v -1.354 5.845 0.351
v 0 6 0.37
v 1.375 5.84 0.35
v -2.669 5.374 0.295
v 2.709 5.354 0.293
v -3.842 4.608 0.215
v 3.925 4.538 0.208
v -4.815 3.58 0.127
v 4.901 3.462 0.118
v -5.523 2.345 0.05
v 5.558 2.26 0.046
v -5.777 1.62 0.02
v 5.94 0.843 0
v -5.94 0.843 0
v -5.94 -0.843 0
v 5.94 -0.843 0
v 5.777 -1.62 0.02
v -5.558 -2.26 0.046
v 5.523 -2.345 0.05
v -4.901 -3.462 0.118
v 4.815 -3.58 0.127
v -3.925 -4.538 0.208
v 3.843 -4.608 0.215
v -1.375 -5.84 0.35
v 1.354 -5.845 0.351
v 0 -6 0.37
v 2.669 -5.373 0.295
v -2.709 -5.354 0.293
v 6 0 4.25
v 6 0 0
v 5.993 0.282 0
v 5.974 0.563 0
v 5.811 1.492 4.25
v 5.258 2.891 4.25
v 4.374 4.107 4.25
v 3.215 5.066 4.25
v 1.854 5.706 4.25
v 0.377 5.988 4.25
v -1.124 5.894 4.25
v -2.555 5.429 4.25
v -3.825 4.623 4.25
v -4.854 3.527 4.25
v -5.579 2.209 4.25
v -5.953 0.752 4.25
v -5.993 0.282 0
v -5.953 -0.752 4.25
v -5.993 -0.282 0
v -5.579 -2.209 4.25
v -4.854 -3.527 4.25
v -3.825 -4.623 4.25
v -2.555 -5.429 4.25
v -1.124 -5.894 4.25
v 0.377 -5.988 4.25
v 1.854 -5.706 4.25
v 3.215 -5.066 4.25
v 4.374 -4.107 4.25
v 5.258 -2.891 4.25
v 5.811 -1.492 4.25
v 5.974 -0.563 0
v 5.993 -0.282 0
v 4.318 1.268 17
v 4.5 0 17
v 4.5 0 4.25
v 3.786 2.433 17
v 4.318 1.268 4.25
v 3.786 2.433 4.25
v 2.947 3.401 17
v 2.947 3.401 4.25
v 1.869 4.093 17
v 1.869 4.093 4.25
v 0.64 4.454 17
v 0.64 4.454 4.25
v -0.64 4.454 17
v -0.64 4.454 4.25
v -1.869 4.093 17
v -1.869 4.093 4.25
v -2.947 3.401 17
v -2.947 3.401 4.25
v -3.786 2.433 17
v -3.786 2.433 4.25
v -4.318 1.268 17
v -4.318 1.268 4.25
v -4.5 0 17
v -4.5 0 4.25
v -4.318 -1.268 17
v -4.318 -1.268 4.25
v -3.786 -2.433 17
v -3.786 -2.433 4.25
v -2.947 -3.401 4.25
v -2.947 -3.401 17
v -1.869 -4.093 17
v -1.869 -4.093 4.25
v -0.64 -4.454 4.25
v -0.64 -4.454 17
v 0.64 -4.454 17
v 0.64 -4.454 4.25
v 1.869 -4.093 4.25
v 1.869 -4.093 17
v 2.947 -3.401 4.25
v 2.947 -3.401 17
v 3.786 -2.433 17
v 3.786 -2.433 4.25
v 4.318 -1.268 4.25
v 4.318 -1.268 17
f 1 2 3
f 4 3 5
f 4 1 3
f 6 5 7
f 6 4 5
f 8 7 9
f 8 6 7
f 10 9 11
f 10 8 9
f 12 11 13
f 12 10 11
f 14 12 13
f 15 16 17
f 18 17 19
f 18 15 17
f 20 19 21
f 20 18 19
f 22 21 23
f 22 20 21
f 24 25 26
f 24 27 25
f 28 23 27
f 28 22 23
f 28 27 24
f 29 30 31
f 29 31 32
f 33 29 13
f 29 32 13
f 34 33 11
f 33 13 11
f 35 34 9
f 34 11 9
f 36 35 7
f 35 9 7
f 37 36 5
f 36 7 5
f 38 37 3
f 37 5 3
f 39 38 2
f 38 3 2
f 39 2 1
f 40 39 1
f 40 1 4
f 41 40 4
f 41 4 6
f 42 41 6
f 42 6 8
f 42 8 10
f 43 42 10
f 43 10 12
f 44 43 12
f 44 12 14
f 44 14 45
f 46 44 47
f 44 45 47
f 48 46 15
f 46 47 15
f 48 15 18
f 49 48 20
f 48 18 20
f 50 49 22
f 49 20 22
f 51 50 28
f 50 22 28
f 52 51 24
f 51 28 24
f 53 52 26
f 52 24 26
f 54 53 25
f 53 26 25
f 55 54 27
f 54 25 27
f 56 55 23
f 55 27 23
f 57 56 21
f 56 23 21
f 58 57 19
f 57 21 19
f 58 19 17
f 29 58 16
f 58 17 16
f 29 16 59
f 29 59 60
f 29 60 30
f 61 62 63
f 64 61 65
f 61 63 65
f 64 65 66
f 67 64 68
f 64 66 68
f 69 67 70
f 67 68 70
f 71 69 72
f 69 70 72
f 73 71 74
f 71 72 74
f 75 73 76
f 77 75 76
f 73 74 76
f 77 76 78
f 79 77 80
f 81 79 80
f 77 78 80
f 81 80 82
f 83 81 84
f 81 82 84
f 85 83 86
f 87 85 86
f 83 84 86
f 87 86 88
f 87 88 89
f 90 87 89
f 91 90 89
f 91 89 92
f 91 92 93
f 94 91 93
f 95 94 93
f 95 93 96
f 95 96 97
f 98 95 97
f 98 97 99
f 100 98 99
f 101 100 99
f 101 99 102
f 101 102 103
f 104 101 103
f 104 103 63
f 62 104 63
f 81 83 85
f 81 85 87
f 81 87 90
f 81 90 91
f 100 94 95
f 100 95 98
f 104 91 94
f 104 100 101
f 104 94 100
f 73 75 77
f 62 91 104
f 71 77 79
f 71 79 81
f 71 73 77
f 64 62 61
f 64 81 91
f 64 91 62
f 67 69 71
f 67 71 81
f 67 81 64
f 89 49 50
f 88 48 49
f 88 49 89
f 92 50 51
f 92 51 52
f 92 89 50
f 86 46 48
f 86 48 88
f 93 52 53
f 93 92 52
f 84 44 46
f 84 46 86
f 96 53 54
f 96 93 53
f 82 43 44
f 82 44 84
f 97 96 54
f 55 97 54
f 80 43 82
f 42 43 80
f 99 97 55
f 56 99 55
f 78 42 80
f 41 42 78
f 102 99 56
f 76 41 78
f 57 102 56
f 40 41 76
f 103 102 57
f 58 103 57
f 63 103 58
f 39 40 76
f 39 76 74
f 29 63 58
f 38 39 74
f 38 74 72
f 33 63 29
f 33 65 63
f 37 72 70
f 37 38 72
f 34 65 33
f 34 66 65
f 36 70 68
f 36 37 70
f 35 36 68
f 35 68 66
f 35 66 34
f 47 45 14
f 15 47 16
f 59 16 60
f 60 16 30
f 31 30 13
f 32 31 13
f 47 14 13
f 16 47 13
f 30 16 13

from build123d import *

# Parameters (mm, degrees)
SKETCH1_R               = 4.5
BOSS_EXTRUDE1_DEPTH     = 17
SKETCH1_3_R             = 6
SKETCH1_3_R_2           = 4.5
BOSS_EXTRUDE2_DEPTH     = 4.25
CUT_EXTRUDE1_DEPTH      = 20
CUT_EXTRUDE1_DEPTH_BACK = 20


with BuildPart() as part:
    # Sketch1 → Boss-Extrude1 (new body)
    with BuildSketch(Plane.XY):
        Circle(SKETCH1_R)
    extrude(amount=BOSS_EXTRUDE1_DEPTH)

    # Sketch1<3> → Boss-Extrude2 (add)
    with BuildSketch(Plane.XY):
        Circle(SKETCH1_3_R)
        Circle(SKETCH1_3_R_2, mode=Mode.SUBTRACT)
    extrude(amount=BOSS_EXTRUDE2_DEPTH)

    # Sketch2 → Cut-Extrude1 (cut, two sides: drawn at the far end of the back side and taken through both)
    with BuildSketch(Plane(origin=(0, 0, 0), x_dir=(0, 0, -1), z_dir=(1, 0, 0)).offset(-CUT_EXTRUDE1_DEPTH_BACK)):
        with BuildLine():
            Line((0, 6), (-0.37, 6))
            ThreePointArc((-0.37, 6), (-0.115349001, 3.426659852), (0, 0.843324554))
            Line((0, 0.843324554), (0, 6))
        make_face()
        with BuildLine():
            Line((0, -6), (0, -0.843324554))
            ThreePointArc((0, -0.843324554), (-0.115349001, -3.426659852), (-0.37, -6))
            Line((-0.37, -6), (0, -6))
        make_face()
    extrude(amount=CUT_EXTRUDE1_DEPTH + CUT_EXTRUDE1_DEPTH_BACK, mode=Mode.SUBTRACT)


solid = part.part
